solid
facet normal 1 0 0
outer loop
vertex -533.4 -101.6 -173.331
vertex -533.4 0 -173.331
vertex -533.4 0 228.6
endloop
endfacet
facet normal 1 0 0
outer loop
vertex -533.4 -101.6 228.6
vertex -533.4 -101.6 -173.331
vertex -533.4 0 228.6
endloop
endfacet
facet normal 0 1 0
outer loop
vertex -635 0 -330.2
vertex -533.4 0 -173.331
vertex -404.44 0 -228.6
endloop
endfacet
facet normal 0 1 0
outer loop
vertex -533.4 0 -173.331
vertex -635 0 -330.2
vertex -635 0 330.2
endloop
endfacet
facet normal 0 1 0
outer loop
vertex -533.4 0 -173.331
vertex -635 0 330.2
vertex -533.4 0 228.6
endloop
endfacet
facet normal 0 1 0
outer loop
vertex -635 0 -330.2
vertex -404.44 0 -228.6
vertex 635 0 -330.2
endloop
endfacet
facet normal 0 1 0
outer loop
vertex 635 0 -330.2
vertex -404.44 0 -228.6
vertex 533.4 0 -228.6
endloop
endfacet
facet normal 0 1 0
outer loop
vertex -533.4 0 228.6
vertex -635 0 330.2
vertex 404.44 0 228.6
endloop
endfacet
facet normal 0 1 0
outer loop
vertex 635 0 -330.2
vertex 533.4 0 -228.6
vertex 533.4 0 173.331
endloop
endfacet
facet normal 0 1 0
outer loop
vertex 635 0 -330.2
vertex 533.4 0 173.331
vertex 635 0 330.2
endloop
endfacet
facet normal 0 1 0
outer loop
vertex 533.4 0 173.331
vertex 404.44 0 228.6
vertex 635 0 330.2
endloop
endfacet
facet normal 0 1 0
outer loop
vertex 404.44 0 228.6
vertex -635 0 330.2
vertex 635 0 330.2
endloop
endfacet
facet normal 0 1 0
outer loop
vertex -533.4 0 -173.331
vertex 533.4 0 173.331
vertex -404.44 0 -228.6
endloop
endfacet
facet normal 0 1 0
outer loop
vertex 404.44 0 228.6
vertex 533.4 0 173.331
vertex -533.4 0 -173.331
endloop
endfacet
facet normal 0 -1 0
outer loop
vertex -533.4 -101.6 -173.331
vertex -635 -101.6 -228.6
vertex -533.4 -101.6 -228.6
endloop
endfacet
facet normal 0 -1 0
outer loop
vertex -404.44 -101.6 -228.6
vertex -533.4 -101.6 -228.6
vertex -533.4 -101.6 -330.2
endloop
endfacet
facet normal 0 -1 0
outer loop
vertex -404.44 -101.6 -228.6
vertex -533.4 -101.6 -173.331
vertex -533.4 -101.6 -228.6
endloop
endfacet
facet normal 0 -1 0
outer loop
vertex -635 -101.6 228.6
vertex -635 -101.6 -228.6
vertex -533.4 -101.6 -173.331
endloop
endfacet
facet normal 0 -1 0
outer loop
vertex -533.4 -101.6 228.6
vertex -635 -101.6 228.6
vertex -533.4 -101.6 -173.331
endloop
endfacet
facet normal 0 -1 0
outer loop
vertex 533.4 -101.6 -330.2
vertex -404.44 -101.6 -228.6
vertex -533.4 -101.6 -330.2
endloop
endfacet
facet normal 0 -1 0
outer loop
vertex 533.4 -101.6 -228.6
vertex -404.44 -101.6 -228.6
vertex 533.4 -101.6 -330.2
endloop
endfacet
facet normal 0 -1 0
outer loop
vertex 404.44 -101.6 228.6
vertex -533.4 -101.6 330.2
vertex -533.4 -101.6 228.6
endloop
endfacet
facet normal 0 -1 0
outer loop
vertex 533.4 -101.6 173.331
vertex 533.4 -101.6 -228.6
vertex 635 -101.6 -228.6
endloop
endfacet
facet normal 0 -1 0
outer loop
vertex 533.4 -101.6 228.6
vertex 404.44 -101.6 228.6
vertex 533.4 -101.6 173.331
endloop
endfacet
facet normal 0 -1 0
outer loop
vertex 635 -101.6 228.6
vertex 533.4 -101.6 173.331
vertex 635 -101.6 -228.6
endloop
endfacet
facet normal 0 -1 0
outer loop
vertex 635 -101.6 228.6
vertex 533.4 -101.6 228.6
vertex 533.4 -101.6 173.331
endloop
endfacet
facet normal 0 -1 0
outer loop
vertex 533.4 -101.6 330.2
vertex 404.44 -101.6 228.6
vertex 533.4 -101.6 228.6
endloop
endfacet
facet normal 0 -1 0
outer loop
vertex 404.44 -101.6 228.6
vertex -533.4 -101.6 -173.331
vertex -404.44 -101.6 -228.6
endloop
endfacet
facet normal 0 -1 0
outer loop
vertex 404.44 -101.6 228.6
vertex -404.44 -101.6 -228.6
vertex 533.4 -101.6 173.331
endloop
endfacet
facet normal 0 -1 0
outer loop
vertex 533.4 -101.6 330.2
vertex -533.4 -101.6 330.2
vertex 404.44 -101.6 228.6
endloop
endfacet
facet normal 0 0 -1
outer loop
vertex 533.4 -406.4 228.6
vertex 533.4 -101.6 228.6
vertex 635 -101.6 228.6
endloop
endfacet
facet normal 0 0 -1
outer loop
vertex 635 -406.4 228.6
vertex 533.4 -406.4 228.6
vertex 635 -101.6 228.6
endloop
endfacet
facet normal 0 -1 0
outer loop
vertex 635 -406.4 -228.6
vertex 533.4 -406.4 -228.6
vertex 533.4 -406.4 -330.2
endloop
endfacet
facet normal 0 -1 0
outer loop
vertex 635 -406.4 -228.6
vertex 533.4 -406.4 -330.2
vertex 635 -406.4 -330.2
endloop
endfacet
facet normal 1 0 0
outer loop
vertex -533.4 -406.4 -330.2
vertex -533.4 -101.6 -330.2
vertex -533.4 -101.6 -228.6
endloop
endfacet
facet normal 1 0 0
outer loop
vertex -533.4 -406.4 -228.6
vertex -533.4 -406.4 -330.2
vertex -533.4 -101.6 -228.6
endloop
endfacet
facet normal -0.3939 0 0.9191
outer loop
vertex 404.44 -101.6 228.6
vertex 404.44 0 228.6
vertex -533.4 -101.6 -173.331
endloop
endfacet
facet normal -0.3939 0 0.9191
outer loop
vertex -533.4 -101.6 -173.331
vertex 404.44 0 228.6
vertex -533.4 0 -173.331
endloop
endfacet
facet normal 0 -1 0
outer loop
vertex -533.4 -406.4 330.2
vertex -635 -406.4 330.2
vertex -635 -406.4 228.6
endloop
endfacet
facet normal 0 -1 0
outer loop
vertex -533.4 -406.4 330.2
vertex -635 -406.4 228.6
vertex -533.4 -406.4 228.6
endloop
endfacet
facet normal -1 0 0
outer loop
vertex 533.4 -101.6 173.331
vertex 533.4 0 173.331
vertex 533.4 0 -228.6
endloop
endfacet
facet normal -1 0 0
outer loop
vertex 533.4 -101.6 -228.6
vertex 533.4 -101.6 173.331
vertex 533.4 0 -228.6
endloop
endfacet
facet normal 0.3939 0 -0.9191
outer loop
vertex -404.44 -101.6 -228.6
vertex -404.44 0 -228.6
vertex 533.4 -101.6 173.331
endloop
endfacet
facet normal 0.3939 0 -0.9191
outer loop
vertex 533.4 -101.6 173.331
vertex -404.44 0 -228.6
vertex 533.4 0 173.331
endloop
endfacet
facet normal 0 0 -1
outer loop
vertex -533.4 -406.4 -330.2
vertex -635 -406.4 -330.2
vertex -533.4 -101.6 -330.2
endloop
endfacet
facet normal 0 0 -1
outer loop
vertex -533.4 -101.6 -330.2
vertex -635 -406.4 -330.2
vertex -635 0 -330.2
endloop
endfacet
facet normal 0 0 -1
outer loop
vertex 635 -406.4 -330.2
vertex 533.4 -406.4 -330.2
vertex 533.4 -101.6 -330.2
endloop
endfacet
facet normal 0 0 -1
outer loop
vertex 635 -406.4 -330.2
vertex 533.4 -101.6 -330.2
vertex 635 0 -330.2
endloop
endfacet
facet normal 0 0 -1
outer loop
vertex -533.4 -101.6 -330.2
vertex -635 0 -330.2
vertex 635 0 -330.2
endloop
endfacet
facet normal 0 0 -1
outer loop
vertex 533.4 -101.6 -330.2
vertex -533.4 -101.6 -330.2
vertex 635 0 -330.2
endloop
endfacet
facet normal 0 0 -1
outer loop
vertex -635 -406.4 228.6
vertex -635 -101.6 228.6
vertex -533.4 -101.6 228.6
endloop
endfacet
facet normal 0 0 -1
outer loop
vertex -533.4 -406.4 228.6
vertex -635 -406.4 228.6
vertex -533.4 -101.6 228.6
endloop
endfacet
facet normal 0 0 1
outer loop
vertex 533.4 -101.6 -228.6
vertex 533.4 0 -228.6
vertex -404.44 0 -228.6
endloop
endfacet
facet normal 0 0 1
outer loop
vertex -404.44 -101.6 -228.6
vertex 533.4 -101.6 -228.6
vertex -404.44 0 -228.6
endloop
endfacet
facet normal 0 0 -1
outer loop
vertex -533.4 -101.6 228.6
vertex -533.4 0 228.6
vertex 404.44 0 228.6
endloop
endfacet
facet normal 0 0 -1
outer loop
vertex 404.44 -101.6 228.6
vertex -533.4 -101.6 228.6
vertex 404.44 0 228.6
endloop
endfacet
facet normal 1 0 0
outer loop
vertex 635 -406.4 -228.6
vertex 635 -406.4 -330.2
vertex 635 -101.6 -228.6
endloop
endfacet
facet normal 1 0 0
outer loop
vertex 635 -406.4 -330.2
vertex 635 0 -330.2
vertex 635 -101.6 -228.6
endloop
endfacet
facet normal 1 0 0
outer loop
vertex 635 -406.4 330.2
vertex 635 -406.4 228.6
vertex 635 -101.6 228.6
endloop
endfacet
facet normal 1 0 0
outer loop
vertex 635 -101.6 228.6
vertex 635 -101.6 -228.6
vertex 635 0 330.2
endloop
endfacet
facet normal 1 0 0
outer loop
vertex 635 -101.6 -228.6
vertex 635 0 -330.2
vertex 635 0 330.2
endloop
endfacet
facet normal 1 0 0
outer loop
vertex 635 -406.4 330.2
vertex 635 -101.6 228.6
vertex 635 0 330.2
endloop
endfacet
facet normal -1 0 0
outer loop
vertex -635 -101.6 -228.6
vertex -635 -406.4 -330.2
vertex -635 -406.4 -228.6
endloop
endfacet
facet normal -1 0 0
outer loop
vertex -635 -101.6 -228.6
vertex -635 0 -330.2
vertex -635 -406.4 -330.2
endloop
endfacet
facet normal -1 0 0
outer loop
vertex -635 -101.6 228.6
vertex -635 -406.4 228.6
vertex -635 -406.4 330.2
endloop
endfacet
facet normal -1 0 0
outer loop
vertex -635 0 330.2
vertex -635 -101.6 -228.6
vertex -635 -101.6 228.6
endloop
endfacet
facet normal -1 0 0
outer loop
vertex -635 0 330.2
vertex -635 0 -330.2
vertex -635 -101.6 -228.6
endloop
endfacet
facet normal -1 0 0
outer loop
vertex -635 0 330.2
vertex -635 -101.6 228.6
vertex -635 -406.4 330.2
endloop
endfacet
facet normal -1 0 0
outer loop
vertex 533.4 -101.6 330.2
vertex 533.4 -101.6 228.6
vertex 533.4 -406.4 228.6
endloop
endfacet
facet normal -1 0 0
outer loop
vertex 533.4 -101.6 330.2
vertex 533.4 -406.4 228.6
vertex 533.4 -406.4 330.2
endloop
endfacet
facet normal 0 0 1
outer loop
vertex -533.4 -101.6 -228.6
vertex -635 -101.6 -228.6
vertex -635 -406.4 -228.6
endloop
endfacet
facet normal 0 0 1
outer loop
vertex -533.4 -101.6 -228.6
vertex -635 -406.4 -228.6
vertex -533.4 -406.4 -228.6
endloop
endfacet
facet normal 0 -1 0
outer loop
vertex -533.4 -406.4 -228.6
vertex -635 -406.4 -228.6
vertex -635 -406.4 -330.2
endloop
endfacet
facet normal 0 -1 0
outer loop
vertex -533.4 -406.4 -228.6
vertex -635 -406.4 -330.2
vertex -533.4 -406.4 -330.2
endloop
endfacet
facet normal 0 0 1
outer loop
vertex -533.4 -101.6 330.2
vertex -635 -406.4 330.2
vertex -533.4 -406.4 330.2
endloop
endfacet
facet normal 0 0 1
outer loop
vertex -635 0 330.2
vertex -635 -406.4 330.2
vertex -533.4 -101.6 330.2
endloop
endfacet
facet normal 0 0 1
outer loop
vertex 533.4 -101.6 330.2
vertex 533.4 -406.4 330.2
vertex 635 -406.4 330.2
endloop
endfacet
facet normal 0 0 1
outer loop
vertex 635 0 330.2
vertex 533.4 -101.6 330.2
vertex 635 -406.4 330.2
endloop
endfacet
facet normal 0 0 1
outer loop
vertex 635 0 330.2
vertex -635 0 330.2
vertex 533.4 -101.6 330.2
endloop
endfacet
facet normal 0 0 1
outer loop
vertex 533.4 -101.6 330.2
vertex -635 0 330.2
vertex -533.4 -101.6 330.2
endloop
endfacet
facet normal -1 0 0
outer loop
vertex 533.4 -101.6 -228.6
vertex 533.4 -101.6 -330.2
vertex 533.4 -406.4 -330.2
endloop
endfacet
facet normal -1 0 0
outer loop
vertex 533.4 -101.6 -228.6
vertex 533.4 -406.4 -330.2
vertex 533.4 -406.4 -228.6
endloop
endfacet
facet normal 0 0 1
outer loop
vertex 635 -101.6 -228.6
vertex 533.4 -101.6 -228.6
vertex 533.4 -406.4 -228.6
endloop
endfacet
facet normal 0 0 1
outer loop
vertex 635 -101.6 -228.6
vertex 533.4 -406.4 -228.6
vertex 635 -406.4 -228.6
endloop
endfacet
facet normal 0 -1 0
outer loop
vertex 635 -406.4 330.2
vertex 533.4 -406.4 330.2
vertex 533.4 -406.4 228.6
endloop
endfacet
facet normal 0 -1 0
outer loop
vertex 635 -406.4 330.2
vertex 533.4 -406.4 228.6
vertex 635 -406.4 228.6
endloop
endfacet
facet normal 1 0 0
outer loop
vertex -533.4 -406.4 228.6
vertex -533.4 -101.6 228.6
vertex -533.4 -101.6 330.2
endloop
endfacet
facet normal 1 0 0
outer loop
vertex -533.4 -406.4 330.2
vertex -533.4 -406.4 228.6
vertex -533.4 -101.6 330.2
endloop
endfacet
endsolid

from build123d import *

# Parameters (mm, degrees)
F0_W      = 1270
F0_H      = 660.4
F1_DEPTH  = 101.6
F2_W      = 101.6
F2_H      = 101.6
F3_DEPTH  = 304.8
F4_W      = 101.6
F4_H      = 101.6
F5_DEPTH  = 304.8
F6_DEPTH  = 304.8
F8_W      = 101.6
F8_H      = 101.6
F9_DEPTH  = 304.8
F7_W      = 101.6
F7_H      = 101.6
F10_DEPTH = 304.8


with BuildPart() as f1:
    # F0 (on Front) → F1 (new body)
    with BuildSketch(Plane.XZ):
        Rectangle(F0_W, F0_H)
        Polygon((533.4, 173.331247), (533.4, -228.6), (-404.439575, -228.6), (-533.4, -228.6), (-533.4, -173.331247), (-533.4, 228.6), (404.439575, 228.6), (533.4, 228.6), align=None, mode=Mode.SUBTRACT)
        Polygon((-533.4, -228.6), (-404.439575, -228.6), (533.4, 173.331247), (533.4, 228.6), (404.439575, 228.6), (-533.4, -173.331247), align=None)
    extrude(amount=F1_DEPTH)

    # F2 (on face) → F3 (join)
    with BuildSketch(Plane.XZ.offset(101.6)):
        with Locations((-584.2, 279.4)):
            Rectangle(F2_W, F2_H)
    extrude(amount=F3_DEPTH)

    # F4 (on face) → F5 (join)
    with BuildSketch(Plane.XZ.offset(101.6)):
        with Locations((-584.2, -279.4)):
            Rectangle(F4_W, F4_H)
    extrude(amount=F5_DEPTH)

    # F4 (on face) → F6 (join)
    with BuildSketch(Plane.XZ.offset(101.6)):
        with Locations((-584.2, -279.4)):
            Rectangle(F4_W, F4_H)
    extrude(amount=F6_DEPTH)

    # F8 (on face) → F9 (join)
    with BuildSketch(Plane.XZ.offset(101.6)):
        with Locations((584.2, 279.4)):
            Rectangle(F8_W, F8_H)
    extrude(amount=F9_DEPTH)

    # F7 (on face) → F10 (join)
    with BuildSketch(Plane.XZ.offset(101.6)):
        with Locations((584.2, -279.4)):
            Rectangle(F7_W, F7_H)
    extrude(amount=F10_DEPTH)


solid = f1.part
